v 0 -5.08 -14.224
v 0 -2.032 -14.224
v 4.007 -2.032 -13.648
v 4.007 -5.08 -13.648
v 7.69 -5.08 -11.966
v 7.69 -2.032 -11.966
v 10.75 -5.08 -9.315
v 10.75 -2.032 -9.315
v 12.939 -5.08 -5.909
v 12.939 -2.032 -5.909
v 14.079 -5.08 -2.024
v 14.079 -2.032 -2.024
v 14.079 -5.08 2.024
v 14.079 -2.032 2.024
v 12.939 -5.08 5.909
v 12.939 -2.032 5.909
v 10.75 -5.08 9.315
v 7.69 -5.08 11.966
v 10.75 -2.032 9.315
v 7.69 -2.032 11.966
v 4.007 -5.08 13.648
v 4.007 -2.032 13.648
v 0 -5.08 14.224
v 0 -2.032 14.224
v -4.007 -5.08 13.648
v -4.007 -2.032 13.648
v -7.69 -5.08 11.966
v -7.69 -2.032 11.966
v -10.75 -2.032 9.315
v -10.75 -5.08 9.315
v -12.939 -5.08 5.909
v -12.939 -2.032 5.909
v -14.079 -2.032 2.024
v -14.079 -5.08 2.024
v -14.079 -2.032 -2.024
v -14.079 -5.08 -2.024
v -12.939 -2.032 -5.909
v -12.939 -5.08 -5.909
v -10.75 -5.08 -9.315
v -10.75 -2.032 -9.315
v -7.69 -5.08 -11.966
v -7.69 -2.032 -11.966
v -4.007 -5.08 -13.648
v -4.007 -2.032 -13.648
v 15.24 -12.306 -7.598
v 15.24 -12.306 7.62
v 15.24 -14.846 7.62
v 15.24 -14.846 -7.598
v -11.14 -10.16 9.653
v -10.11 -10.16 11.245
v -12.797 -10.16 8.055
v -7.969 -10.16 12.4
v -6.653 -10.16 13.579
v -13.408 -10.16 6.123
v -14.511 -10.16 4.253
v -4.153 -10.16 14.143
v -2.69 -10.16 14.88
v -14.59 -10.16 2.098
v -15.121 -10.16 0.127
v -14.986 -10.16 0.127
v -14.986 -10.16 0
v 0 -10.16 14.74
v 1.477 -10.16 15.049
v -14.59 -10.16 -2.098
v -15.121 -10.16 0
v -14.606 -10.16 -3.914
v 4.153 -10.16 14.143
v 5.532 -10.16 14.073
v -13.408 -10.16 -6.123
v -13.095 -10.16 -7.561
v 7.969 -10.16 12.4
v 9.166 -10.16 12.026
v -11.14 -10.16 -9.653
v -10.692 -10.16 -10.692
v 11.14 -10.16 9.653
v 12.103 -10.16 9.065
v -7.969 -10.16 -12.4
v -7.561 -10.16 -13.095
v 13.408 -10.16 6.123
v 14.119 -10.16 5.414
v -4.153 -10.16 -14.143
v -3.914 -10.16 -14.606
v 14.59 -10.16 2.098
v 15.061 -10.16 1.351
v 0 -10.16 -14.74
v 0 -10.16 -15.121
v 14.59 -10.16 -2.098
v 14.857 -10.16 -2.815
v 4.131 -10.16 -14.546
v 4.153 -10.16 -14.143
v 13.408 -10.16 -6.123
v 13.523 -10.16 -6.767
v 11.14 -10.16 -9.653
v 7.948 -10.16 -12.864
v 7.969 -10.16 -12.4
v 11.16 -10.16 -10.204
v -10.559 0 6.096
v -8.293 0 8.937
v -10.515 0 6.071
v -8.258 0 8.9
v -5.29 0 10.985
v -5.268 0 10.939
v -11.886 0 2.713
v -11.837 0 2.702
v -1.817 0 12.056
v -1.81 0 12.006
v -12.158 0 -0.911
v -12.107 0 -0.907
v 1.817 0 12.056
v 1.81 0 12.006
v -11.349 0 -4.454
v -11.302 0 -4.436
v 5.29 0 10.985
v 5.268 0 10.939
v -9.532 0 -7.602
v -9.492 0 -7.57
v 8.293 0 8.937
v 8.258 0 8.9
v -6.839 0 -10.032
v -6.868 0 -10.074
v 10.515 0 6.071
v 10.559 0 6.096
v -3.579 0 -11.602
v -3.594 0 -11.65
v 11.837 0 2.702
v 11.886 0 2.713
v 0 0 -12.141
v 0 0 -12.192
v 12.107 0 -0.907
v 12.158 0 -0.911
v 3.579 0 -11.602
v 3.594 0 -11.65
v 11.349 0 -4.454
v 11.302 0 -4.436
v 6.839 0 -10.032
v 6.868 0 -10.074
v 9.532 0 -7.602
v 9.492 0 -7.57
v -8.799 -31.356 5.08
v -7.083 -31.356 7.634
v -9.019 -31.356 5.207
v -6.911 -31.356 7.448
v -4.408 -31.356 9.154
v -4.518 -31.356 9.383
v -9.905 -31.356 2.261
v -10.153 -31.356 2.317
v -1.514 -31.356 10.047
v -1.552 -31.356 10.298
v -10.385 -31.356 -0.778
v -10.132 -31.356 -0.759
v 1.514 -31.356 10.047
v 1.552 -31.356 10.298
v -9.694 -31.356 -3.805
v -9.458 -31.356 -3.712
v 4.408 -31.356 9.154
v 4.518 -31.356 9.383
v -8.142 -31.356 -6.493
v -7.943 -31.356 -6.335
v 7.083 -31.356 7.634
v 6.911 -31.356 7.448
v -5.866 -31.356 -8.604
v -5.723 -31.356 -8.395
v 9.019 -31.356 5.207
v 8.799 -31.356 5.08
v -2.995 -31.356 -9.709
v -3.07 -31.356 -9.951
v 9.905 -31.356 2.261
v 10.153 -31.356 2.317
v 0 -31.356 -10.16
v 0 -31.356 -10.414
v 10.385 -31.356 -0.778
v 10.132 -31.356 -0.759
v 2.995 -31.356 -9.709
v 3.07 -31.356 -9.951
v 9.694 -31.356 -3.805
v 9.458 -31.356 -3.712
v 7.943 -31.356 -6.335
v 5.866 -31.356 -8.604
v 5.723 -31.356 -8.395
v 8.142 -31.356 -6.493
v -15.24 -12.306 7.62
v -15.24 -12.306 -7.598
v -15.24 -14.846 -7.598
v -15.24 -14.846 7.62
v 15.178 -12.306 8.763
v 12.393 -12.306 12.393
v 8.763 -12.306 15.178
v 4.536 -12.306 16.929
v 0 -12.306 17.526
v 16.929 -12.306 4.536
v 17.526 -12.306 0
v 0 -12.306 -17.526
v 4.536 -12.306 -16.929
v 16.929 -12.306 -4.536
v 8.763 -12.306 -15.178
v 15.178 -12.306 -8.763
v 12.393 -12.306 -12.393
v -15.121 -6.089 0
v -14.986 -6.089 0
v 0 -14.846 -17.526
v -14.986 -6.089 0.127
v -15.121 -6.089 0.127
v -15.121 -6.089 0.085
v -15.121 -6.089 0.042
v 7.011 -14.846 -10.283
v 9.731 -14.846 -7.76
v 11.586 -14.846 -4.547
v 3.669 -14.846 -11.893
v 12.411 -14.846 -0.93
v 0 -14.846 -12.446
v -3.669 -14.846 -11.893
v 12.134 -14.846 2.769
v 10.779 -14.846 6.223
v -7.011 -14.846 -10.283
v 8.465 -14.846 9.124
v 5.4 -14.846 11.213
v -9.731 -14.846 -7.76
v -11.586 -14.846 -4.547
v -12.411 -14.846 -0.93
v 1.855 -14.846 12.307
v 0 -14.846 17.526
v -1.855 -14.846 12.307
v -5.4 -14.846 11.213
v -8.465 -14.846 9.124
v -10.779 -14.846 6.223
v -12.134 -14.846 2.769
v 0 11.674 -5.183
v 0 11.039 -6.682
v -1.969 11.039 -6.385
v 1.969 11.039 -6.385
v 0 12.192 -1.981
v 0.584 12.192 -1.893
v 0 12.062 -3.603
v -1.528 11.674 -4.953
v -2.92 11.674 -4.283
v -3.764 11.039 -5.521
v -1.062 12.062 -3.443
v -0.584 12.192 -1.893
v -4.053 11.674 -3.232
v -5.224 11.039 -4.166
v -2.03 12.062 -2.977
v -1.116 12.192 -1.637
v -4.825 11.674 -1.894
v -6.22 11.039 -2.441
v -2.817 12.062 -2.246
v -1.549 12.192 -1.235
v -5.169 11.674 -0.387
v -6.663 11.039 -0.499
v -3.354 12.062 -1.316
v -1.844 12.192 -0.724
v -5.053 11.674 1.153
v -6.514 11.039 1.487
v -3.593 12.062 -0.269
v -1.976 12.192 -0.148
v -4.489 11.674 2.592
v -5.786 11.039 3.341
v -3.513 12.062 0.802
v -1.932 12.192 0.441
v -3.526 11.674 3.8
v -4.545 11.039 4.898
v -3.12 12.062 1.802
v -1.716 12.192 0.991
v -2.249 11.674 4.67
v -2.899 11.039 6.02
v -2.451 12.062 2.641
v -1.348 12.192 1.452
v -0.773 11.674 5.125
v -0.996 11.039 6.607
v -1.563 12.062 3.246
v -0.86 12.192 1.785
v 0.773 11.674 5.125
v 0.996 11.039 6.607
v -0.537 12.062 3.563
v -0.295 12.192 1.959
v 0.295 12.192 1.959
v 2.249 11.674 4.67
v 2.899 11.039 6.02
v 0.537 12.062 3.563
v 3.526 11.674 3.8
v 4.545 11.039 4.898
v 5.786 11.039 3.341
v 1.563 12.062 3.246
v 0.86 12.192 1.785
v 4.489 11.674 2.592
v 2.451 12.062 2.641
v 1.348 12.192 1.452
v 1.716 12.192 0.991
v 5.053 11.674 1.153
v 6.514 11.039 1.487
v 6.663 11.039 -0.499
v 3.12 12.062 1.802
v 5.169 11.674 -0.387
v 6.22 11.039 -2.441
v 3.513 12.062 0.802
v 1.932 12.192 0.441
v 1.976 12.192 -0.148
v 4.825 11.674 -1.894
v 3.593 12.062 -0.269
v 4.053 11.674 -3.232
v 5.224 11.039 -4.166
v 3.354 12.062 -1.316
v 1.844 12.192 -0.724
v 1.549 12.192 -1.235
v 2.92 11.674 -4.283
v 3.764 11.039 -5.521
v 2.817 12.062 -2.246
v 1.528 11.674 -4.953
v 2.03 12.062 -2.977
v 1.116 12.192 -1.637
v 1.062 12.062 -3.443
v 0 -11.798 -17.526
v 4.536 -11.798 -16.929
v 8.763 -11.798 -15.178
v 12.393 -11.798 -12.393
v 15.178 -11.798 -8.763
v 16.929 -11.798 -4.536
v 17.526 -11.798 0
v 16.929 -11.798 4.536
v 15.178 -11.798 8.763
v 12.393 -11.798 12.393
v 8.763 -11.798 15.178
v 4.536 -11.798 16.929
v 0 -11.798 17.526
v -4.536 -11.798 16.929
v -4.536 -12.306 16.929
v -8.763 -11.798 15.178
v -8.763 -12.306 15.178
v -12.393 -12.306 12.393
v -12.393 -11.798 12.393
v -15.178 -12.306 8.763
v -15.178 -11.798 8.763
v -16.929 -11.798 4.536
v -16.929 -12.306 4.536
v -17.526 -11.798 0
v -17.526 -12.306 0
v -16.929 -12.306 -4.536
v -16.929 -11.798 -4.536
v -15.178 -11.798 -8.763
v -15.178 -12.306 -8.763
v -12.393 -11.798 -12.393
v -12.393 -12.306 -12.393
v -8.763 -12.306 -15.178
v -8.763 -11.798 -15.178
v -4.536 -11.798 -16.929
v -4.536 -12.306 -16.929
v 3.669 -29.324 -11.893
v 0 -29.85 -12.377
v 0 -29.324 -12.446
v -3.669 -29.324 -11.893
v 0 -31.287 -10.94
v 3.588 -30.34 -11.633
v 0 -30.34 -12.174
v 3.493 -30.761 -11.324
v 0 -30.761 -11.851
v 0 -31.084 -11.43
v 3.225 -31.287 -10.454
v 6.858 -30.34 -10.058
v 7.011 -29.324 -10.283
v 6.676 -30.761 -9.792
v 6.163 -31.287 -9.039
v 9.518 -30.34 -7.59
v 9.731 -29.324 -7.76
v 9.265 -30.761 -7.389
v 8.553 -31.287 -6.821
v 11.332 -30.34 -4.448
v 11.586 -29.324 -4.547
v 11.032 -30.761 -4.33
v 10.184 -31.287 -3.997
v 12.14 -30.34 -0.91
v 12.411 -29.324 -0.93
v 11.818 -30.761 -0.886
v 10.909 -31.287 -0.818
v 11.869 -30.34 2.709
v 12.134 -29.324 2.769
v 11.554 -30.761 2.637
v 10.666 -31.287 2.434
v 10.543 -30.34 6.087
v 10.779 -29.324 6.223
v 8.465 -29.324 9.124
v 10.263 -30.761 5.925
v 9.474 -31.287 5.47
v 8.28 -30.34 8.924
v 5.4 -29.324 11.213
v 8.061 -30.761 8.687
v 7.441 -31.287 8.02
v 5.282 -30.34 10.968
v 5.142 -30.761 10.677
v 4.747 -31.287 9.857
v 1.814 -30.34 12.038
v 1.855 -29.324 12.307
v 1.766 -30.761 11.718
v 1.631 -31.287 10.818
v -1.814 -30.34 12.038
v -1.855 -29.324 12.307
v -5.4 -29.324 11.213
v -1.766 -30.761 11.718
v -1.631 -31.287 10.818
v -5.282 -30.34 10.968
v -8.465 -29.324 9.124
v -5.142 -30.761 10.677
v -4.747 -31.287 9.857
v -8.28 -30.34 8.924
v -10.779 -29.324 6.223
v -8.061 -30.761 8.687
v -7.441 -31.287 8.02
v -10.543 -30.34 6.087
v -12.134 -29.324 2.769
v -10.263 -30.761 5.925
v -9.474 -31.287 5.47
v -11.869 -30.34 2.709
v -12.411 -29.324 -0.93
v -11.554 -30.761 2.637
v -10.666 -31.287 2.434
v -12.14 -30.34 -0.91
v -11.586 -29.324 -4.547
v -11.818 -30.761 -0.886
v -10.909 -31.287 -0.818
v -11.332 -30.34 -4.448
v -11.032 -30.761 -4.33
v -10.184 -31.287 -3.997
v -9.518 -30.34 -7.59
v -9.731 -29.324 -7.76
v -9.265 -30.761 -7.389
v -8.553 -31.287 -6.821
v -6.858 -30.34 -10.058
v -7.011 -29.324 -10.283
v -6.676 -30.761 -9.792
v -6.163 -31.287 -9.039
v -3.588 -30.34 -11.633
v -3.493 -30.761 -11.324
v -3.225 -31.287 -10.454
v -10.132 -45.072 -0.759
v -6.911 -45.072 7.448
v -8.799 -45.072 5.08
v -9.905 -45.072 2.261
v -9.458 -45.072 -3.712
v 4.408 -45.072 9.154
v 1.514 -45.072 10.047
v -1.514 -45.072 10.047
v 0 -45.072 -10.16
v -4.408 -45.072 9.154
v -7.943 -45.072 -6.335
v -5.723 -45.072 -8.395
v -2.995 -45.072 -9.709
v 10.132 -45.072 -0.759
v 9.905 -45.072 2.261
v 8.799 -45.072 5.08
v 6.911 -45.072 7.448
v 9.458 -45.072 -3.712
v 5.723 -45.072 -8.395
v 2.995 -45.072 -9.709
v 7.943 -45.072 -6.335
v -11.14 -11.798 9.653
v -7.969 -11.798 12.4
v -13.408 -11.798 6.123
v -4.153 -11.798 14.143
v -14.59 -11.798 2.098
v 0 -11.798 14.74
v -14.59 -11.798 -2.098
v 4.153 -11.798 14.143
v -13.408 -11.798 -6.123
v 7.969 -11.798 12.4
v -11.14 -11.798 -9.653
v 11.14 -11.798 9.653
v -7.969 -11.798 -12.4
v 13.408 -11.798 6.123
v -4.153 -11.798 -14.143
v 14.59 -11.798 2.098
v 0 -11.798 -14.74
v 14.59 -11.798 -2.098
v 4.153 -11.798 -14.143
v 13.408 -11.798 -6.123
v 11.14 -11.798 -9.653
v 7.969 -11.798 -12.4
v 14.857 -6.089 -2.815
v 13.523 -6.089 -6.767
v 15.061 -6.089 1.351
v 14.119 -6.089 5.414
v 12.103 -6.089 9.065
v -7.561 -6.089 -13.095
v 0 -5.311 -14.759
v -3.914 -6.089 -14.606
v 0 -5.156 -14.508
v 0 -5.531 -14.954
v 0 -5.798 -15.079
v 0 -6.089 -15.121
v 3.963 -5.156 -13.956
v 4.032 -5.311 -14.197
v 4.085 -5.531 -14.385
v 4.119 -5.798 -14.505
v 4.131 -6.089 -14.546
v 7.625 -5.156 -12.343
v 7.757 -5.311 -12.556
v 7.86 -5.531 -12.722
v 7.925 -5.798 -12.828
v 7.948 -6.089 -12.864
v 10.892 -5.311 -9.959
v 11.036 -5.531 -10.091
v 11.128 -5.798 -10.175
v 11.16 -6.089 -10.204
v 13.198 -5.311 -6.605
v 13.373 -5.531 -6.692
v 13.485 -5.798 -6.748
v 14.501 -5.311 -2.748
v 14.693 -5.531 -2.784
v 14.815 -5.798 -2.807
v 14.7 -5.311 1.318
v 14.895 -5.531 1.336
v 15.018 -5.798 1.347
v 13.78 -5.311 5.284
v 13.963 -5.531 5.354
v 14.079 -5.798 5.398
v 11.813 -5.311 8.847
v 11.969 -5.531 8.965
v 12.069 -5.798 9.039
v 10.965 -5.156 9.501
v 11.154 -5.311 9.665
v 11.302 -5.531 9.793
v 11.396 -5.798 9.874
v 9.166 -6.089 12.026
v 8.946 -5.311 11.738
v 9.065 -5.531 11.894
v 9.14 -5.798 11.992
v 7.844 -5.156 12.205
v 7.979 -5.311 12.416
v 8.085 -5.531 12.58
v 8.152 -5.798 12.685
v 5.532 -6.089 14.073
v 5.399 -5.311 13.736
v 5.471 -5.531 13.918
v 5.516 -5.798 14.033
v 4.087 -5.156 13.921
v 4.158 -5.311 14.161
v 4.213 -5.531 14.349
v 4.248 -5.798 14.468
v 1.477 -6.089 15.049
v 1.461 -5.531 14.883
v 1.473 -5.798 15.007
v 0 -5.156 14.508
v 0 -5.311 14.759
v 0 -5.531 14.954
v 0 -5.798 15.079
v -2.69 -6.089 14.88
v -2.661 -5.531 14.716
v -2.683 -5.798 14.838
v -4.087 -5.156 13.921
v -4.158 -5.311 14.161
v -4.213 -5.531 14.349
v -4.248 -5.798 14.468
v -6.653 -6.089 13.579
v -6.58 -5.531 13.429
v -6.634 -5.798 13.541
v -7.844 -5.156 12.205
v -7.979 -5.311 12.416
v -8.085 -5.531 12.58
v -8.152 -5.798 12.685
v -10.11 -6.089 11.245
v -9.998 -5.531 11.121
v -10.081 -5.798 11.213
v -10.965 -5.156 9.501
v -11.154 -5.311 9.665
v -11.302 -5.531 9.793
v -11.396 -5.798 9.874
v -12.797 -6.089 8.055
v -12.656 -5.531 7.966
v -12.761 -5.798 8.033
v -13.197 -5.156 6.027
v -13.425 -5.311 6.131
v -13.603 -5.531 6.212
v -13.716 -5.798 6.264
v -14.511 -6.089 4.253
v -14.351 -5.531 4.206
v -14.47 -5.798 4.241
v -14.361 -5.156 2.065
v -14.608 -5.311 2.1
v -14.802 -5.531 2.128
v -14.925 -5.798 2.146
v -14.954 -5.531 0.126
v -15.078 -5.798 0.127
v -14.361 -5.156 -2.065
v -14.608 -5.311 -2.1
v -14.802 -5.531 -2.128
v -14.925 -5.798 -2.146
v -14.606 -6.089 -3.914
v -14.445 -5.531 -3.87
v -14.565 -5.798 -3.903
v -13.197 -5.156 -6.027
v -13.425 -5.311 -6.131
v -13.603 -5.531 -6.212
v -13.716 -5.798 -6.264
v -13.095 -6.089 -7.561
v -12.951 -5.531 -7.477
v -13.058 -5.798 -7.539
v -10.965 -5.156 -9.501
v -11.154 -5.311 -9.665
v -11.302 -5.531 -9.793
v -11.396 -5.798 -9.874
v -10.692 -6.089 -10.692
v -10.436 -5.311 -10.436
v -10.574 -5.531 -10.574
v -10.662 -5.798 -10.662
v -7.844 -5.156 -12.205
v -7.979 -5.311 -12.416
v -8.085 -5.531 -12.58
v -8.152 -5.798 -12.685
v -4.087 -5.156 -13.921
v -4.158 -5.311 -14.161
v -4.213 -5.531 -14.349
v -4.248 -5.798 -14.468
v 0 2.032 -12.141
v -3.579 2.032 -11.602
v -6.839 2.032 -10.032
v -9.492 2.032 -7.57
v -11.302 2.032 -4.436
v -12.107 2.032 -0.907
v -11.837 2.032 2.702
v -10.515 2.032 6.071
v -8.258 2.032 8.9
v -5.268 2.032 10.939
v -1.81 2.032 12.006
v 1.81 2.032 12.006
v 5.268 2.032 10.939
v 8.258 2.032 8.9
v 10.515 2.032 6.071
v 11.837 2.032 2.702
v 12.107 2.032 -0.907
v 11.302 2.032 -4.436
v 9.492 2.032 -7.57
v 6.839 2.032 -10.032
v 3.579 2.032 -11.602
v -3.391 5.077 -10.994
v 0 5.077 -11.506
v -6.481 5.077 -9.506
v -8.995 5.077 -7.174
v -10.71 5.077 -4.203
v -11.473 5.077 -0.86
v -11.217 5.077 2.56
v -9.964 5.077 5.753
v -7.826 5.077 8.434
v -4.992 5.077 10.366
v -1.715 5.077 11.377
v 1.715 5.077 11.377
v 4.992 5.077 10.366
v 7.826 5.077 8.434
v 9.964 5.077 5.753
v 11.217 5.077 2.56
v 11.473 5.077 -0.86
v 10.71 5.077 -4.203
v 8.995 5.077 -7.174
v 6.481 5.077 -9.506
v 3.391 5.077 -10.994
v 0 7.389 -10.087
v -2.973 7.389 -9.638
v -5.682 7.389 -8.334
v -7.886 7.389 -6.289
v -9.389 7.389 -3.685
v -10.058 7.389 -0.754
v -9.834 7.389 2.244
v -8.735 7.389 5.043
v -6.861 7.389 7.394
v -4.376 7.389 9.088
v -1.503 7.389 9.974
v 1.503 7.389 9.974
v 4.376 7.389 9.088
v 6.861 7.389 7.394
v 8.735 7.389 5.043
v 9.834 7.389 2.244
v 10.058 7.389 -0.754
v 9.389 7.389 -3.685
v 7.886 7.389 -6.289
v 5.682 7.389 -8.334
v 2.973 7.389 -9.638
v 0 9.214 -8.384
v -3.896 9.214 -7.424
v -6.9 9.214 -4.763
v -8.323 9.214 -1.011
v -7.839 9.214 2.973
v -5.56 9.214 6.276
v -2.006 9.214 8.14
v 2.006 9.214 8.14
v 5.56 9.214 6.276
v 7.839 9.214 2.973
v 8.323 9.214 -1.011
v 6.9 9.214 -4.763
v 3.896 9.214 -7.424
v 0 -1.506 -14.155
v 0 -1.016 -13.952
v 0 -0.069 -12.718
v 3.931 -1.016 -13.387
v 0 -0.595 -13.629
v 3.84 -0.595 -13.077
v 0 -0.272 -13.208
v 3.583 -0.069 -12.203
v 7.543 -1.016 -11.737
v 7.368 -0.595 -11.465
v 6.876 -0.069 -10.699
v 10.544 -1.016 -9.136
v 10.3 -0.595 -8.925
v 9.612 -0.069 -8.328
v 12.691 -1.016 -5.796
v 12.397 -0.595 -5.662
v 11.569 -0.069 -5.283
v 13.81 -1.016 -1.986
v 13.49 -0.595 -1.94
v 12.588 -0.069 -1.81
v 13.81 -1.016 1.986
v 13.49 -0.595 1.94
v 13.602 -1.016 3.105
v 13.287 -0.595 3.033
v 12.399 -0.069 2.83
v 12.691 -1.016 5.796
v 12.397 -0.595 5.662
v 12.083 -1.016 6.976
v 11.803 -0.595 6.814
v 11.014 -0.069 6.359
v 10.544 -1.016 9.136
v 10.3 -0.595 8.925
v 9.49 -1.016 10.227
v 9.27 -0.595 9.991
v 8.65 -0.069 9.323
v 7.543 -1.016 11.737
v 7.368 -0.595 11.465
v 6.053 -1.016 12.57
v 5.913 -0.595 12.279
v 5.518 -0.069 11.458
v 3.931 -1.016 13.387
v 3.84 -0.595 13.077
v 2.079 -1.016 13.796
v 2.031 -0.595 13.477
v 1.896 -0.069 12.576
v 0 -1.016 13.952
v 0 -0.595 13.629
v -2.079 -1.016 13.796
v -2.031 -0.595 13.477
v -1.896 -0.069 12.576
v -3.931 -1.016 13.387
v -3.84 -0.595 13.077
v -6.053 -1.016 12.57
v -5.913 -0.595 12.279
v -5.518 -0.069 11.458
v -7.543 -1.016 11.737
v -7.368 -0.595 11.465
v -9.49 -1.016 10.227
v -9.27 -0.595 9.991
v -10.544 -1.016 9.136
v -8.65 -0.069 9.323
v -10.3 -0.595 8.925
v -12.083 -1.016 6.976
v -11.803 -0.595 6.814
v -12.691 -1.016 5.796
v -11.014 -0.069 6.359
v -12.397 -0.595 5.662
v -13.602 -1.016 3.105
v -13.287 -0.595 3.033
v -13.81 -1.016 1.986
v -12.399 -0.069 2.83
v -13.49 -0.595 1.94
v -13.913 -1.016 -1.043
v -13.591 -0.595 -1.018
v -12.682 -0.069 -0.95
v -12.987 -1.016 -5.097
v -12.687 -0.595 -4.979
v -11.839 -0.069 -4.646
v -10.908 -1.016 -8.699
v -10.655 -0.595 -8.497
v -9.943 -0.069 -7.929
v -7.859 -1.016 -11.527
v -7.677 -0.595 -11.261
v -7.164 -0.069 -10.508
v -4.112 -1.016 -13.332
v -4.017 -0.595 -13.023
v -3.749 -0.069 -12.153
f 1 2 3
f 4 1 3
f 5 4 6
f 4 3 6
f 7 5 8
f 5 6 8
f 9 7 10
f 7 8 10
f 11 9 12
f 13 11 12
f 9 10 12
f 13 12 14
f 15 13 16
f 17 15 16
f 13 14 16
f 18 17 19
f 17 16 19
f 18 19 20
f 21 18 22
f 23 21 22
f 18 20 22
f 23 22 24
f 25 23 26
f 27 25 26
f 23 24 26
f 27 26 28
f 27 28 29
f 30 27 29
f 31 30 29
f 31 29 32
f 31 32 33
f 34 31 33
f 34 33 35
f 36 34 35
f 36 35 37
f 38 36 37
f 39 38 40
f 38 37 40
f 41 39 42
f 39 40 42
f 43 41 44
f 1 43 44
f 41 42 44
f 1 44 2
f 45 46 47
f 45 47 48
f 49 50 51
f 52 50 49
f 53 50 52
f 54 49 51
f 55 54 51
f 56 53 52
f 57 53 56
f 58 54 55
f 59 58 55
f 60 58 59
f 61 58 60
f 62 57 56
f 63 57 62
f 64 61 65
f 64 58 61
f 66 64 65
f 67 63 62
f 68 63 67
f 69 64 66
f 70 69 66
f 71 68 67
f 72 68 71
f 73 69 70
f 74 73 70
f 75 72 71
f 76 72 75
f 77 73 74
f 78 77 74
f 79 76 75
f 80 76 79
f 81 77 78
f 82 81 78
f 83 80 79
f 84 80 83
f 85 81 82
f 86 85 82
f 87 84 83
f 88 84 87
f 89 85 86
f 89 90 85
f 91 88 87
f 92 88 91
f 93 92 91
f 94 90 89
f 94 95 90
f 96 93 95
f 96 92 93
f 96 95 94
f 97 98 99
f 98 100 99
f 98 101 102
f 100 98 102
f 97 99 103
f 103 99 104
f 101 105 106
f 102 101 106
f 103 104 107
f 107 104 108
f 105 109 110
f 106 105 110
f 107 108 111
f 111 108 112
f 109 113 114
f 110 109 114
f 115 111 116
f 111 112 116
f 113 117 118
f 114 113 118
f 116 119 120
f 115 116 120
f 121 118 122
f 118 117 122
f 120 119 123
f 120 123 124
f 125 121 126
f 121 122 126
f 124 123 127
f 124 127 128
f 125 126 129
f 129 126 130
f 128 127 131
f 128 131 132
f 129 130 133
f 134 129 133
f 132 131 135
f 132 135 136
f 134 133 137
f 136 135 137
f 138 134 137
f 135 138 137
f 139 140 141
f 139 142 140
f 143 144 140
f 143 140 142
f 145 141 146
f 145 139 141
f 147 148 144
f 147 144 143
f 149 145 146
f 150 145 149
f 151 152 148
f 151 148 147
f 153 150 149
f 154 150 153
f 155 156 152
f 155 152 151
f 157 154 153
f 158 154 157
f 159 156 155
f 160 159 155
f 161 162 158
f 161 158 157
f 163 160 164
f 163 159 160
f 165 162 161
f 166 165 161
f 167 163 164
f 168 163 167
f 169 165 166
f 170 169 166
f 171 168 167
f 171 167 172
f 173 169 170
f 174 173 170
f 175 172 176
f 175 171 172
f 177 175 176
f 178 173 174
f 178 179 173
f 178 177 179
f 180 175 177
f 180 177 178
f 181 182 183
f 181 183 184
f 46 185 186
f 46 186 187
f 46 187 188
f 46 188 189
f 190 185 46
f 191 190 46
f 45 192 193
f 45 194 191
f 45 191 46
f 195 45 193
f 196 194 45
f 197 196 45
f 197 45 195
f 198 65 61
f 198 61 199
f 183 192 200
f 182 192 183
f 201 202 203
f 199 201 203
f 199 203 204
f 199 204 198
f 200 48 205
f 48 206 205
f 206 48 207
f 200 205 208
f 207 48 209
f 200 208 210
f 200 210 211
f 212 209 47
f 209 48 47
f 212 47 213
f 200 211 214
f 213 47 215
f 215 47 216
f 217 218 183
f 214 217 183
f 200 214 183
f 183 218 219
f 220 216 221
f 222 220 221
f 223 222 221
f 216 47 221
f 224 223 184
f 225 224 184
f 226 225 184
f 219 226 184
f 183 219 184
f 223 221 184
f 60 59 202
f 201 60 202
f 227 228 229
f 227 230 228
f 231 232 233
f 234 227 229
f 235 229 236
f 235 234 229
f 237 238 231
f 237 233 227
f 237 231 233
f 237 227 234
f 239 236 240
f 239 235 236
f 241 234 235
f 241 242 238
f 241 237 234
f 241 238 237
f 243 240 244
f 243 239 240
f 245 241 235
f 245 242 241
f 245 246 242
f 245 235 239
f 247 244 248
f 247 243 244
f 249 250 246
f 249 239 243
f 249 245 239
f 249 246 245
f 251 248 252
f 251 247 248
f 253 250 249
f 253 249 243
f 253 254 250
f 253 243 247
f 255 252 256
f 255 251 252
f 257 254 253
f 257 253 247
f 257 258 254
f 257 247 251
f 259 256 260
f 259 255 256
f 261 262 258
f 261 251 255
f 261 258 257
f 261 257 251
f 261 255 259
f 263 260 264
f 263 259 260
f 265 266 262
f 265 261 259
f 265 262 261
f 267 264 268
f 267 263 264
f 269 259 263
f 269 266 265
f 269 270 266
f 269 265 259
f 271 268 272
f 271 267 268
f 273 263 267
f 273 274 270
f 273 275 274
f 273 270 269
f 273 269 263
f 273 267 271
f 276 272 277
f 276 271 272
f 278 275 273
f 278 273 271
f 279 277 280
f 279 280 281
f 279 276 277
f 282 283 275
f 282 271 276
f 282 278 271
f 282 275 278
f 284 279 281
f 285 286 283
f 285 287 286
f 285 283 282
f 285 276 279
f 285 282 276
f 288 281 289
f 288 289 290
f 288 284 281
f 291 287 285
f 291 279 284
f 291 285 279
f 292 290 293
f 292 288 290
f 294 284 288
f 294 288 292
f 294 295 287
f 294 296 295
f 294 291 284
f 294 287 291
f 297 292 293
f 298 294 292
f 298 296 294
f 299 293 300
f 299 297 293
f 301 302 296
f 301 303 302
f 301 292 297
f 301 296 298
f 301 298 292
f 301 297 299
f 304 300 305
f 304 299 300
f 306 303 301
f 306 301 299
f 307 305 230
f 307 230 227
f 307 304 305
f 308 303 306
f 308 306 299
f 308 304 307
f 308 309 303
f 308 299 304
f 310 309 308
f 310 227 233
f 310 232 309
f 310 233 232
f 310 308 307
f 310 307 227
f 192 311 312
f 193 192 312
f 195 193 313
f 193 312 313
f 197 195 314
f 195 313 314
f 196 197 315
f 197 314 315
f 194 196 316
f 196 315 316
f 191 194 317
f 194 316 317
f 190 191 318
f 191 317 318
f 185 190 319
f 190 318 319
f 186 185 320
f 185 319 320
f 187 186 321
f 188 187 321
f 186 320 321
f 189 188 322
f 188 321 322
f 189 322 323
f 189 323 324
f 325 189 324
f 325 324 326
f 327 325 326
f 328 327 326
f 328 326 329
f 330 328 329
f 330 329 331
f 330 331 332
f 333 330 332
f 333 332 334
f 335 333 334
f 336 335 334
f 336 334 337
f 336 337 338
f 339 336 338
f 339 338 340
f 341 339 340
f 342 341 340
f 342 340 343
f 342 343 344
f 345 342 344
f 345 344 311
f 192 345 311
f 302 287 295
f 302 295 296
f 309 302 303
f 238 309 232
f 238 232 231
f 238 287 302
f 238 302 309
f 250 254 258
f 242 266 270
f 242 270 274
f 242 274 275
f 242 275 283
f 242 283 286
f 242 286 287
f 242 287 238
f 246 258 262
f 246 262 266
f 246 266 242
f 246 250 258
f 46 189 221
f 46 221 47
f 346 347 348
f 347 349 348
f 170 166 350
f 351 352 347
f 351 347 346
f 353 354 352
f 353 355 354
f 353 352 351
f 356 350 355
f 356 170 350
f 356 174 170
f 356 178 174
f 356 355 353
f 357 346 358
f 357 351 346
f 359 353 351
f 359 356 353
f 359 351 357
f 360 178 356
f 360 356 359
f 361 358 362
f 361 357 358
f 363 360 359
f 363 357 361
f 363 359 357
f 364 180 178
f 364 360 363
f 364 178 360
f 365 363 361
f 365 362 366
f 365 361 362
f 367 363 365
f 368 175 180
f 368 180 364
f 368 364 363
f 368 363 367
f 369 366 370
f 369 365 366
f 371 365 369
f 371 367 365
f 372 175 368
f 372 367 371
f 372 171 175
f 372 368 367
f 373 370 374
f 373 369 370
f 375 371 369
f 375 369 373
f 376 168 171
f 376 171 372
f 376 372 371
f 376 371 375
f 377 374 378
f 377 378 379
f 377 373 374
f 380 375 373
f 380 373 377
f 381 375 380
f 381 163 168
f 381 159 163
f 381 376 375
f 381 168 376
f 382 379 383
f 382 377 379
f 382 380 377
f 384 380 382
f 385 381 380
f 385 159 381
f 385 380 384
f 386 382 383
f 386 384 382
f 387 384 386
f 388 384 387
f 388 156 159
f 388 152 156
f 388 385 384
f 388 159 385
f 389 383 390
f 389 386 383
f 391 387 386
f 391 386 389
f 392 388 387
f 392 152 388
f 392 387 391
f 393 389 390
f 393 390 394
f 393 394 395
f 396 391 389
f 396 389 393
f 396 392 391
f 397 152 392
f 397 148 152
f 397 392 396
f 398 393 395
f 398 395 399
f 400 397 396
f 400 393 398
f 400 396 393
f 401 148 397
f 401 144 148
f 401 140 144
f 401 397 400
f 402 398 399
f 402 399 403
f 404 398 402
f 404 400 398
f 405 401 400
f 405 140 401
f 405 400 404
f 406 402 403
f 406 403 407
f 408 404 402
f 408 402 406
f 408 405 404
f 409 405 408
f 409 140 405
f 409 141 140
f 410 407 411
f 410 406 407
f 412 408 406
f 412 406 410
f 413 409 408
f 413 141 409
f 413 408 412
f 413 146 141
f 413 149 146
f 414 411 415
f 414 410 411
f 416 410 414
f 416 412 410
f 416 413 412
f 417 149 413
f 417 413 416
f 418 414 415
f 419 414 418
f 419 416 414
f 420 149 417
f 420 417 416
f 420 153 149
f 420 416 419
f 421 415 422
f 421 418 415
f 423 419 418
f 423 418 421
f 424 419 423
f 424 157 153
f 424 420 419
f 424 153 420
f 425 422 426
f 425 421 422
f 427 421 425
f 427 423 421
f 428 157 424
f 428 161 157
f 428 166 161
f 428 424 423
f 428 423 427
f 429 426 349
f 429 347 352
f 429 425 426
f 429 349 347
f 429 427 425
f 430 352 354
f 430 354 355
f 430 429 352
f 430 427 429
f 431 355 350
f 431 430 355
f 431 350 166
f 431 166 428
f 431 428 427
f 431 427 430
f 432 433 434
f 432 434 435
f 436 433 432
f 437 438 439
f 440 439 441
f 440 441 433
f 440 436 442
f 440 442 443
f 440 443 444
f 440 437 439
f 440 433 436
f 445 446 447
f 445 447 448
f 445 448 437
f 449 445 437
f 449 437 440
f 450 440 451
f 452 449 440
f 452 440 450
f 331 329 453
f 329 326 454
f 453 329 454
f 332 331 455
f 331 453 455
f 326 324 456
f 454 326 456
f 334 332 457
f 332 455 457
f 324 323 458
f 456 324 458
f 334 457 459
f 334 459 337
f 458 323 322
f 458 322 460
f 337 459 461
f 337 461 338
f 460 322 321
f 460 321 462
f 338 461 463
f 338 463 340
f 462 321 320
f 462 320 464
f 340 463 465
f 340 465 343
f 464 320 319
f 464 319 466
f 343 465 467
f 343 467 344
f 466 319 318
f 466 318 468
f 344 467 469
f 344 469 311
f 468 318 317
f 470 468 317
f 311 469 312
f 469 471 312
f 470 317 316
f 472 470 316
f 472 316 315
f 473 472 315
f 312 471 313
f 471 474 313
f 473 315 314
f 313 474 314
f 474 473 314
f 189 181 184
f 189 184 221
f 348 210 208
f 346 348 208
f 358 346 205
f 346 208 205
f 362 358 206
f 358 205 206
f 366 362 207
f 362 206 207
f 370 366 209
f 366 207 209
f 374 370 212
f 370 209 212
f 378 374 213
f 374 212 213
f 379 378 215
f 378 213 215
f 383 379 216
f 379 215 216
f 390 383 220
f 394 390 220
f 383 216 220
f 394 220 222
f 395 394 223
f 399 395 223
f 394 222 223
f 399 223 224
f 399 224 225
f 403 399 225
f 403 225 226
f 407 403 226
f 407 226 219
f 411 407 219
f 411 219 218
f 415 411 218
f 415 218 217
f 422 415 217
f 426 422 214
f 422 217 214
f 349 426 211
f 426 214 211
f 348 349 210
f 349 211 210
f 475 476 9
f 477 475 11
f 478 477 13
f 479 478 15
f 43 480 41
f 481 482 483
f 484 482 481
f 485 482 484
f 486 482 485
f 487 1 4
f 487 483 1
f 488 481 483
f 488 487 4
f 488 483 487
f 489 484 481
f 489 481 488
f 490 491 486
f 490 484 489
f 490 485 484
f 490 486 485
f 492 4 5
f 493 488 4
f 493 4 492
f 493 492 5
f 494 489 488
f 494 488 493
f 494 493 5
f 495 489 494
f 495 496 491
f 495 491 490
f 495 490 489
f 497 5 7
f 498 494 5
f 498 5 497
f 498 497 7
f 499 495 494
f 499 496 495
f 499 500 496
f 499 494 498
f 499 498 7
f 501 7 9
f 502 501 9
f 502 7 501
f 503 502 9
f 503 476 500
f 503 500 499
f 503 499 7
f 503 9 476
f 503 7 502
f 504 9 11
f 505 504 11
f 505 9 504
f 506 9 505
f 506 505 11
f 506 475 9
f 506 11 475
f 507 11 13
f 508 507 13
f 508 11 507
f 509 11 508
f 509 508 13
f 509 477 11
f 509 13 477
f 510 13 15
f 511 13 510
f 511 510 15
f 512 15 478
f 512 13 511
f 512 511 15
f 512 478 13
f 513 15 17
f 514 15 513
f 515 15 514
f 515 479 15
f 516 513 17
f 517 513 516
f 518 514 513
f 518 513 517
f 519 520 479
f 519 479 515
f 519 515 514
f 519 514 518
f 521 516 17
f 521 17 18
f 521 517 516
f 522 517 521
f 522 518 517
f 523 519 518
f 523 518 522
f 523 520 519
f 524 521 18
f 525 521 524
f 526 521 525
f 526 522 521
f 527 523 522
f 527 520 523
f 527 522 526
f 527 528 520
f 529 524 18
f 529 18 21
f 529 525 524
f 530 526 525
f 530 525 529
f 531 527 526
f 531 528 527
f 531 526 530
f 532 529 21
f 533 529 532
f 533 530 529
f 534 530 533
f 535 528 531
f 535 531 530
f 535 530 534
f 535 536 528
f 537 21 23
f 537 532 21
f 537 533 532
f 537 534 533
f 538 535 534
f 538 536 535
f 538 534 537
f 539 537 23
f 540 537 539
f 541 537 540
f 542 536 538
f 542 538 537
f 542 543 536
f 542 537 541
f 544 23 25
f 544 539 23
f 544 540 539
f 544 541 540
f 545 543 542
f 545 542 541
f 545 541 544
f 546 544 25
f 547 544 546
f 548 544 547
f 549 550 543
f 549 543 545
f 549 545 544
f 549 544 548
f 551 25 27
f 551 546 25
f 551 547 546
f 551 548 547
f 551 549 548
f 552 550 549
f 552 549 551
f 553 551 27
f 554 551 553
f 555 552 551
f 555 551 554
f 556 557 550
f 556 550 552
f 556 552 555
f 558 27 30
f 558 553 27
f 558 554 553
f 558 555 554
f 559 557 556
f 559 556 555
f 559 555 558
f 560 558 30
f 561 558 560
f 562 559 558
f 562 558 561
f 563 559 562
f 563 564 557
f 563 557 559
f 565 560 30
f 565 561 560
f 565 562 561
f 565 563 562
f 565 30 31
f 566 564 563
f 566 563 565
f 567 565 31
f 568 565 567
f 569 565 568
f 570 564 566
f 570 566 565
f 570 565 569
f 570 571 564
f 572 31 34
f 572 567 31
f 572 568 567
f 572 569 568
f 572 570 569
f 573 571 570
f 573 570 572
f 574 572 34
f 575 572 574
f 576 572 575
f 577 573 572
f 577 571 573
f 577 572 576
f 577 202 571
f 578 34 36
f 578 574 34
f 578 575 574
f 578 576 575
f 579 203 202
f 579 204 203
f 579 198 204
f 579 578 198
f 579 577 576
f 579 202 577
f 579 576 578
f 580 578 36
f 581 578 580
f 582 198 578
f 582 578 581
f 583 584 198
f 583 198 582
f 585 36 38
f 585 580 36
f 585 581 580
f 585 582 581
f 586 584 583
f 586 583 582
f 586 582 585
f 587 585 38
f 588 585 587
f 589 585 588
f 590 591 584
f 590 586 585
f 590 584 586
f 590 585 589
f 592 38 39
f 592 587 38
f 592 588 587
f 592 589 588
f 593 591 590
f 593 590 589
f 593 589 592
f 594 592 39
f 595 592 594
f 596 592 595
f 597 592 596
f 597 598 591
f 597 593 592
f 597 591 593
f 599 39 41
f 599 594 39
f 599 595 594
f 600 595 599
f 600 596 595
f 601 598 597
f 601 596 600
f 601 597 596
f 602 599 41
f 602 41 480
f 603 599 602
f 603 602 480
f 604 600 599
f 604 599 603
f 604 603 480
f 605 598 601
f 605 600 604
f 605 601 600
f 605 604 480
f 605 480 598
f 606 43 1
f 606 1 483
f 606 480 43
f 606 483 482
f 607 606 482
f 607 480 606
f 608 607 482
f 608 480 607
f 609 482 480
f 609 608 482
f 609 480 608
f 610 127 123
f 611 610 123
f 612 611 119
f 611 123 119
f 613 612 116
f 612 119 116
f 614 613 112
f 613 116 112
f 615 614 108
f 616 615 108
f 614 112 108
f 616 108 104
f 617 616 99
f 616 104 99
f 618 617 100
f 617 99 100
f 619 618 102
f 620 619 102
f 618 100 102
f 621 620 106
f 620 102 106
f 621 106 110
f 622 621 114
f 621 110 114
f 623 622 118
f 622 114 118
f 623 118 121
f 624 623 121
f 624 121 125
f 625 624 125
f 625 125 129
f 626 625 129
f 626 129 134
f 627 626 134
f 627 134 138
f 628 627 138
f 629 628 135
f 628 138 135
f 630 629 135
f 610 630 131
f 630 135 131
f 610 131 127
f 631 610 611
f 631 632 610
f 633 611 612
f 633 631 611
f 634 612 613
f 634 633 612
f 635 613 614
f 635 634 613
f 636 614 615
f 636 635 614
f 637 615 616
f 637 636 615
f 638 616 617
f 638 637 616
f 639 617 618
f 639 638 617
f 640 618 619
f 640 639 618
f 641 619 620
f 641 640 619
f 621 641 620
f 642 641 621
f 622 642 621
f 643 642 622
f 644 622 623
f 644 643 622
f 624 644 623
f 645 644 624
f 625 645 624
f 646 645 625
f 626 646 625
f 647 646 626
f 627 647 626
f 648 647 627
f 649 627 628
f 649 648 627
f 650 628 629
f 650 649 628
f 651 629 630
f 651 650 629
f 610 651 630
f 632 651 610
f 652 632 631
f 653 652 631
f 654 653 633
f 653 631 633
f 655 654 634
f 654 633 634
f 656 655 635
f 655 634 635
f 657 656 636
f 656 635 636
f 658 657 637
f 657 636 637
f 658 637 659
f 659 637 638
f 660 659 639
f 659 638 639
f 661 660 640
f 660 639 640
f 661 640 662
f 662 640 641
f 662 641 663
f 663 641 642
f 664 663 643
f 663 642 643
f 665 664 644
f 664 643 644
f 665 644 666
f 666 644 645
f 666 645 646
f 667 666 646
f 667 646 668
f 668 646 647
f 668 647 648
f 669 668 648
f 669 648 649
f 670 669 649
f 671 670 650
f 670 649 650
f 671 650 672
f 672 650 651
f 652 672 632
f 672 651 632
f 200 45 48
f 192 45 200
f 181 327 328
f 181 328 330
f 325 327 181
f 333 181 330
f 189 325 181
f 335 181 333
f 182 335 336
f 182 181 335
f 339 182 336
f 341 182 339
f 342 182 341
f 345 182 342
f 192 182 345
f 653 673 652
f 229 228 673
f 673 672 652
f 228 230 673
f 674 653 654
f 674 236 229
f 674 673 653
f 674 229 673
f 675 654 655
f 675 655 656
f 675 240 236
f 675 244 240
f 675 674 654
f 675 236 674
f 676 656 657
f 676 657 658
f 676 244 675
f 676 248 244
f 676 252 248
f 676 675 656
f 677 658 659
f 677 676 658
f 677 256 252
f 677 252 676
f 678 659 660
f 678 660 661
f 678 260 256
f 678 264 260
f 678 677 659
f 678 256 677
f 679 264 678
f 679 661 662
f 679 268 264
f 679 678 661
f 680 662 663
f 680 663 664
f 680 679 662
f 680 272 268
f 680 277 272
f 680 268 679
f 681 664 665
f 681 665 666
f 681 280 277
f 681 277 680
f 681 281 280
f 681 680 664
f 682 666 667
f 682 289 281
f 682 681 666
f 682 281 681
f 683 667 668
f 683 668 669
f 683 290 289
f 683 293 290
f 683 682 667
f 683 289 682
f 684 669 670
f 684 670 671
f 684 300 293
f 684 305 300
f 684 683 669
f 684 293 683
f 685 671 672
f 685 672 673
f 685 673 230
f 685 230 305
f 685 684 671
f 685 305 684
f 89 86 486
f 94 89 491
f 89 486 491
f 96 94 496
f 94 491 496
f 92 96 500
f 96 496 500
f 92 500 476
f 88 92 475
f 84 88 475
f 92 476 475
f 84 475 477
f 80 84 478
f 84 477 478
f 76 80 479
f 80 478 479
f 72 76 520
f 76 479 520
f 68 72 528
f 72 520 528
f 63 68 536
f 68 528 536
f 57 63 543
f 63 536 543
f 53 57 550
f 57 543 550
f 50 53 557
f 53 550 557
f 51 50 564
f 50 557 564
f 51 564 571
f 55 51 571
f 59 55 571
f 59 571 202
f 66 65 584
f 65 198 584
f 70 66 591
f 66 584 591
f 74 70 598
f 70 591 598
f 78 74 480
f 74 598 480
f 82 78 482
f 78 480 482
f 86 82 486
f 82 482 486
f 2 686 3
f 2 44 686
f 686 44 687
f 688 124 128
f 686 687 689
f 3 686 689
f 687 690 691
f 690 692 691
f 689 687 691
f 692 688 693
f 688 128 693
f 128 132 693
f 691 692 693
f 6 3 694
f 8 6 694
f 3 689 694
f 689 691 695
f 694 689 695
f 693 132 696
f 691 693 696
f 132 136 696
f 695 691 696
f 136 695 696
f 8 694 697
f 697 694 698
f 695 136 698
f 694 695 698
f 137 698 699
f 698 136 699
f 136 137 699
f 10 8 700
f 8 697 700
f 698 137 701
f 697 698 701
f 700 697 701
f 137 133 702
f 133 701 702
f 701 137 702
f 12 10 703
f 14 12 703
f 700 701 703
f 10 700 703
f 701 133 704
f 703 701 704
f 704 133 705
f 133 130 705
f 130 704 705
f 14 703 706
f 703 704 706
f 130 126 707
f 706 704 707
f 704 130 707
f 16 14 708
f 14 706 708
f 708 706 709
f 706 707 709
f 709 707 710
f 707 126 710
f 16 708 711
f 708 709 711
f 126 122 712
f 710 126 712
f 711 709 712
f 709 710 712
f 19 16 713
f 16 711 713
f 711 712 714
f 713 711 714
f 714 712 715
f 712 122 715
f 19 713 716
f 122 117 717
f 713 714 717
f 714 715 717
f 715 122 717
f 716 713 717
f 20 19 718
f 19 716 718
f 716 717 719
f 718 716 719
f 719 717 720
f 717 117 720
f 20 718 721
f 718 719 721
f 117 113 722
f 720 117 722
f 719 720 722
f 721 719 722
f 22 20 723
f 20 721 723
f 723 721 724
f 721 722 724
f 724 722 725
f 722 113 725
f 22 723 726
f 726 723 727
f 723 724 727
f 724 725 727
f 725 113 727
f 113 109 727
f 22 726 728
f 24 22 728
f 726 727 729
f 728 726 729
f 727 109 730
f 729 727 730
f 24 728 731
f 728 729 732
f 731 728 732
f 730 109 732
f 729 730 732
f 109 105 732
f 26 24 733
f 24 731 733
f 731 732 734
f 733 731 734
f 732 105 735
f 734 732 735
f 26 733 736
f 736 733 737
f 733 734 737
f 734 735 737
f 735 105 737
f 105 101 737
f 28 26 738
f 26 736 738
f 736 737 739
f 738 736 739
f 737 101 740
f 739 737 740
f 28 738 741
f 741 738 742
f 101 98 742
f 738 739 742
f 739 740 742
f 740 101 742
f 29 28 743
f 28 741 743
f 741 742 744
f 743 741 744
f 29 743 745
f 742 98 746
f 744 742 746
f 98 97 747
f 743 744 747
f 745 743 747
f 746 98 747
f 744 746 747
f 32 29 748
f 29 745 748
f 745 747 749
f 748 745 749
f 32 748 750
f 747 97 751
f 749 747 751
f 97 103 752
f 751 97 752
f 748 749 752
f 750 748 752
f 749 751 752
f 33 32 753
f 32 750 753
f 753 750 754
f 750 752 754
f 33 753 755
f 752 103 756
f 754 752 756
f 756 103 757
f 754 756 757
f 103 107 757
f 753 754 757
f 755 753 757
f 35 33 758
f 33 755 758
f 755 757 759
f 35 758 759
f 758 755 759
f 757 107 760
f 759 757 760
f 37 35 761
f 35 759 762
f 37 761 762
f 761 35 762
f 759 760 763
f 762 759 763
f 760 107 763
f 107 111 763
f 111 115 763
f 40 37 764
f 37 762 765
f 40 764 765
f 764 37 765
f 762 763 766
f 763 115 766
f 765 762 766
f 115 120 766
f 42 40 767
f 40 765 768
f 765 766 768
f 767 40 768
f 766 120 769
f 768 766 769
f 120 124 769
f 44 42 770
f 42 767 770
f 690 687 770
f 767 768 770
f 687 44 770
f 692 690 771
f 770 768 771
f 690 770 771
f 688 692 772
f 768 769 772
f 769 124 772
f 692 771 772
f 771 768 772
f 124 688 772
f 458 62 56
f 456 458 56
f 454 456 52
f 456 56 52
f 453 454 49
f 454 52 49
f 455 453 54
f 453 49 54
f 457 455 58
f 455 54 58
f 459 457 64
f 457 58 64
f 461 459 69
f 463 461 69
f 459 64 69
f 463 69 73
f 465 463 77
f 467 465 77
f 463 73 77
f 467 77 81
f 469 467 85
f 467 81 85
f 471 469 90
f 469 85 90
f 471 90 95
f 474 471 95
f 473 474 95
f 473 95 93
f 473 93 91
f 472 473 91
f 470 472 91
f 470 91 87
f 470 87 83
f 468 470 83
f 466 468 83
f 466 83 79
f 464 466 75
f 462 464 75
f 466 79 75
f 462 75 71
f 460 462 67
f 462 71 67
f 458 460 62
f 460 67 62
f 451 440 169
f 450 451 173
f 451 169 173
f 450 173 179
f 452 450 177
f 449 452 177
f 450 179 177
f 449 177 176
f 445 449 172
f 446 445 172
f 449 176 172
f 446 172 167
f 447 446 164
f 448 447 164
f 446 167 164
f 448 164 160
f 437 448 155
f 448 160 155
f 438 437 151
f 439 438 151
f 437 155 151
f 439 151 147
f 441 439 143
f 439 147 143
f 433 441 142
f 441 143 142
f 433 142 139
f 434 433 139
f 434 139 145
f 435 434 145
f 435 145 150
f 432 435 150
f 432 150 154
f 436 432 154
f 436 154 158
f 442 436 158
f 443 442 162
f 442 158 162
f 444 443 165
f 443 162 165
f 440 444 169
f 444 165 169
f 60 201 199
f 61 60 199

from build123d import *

# Parameters (mm, degrees)
SKETCH1_R           = 12.1412
BOSS_EXTRUDE1_DEPTH = 12.192
FILLET1_R           = 10.16
SKETCH3_R           = 14.224
BOSS_EXTRUDE2_DEPTH = 5.08
FILLET6_R           = 2.032
SKETCH8_R           = 15.121257553
BOSS_EXTRUDE3_DEPTH = 5.08
FILLET7_R           = 1.016
SKETCH9_W           = 0.127
SKETCH9_H           = 4.070962721
CUT_EXTRUDE1_DEPTH  = 0.254
SKETCH13_R          = 14.74025754
BOSS_EXTRUDE4_DEPTH = 1.6383
SKETCH14_R          = 17.526
BOSS_EXTRUDE5_DEPTH = 0.508
BOSS_EXTRUDE6_DEPTH = 2.54
SKETCH16_R          = 12.446
BOSS_EXTRUDE7_DEPTH = 16.51
SKETCH17_R          = 10.16
BOSS_EXTRUDE8_DEPTH = 13.716
FILLET8_R           = 2.032


with BuildPart() as part:
    # Sketch1 → Boss-Extrude1 (new body)
    with BuildSketch(Plane(origin=(0, 0, 0), x_dir=(1, 0, 0), z_dir=(0, 1, 0))):
        with Locations(Location((0, 0, 0), (0, 0, 90))):
            Circle(SKETCH1_R)
    extrude(amount=BOSS_EXTRUDE1_DEPTH)

    # Fillet1
    fillet1_edges = [part.edges().sort_by_distance(p)[0] for p in [
        (0, 12.192, 12.1412),
    ]]
    fillet(fillet1_edges, radius=FILLET1_R)

    # Sketch3 → Boss-Extrude2 (add)
    with BuildSketch(Plane.XZ):
        with Locations(Location((0, 0, 0), (0, 0, 270))):
            Circle(SKETCH3_R)
    extrude(amount=BOSS_EXTRUDE2_DEPTH)

    # Sketch4 → Cut-Revolve1 (revolve, cut)
    with BuildSketch(Plane(origin=(0, 0, 0), x_dir=(0, 0, -1), z_dir=(1, 0, 0))):
        Polygon((11.292993812, 6.096), (6.681516056, 11.039365263), (11.292993812, 11.039365263), align=None)
    revolve(axis=Axis((0, 0, 0), (0, 1, 0)), mode=Mode.SUBTRACT)

    # Sketch5 → Cut-Revolve2 (revolve, cut)
    with BuildSketch(Plane(origin=(0, 0, 0), x_dir=(0, 0, -1), z_dir=(1, 0, 0))):
        Polygon((12.1412, 2.032), (11.292993812, 6.096), (14.961110493, 2.032), align=None)
    revolve(axis=Axis((0, 0, 0), (0, 1, 0)), mode=Mode.SUBTRACT)

    # Sketch7 → Cut-Revolve3 (revolve, cut)
    with BuildSketch(Plane.XY, mode=Mode.PRIVATE) as cut_revolve3_sk:
        Polygon((-10.086523159, 7.389300203), (-11.857198071, 4.504575846), (-11.857198071, 7.389300203), align=None)
    revolve(cut_revolve3_sk.sketch.rotate(Axis((0, 0, 0), (0, 1, 0)), 270), axis=Axis((0, 0, 0), (0, 1, 0)), mode=Mode.SUBTRACT)

    # Fillet6
    fillet6_edges = [part.edges().sort_by_distance(p)[0] for p in [
        (0, 0, 14.224),
    ]]
    fillet(fillet6_edges, radius=FILLET6_R)

    # Sketch8 → Boss-Extrude3 (add)
    with BuildSketch(Plane.XZ.offset(5.08)):
        with Locations(Location((0, 0, 0), (0, 0, 270))):
            Circle(SKETCH8_R)
    extrude(amount=BOSS_EXTRUDE3_DEPTH)

    # Fillet7
    # the kernel refuses this fillet: 1.016 mm, written as the material it takes off along each edge
    with BuildSketch(Plane(origin=(0, -5.08, 0), x_dir=(0, 0, -1), z_dir=(-1, 0, 0))) as fillet7_piece_1:
        with BuildLine():
            CenterArc((14.105257553, 1.009037279), FILLET7_R, 276.711639073, 83.288360927)
            Line((14.224, 0), (14.226374849, -0.020180746))
            ThreePointArc((14.226374849, -0.020180746), (14.672628776, -0.02032), (15.121257553, -0.02032))
            Line((15.121257553, -0.02032), (15.141577553, 0))
            Line((15.141577553, 0), (15.141577553, 1.009037279))
            Line((15.141577553, 1.009037279), (15.121257553, 1.009037279))
        make_face()
    revolve(axis=Axis((0, -5.08, 0), (0, -1, 0)), mode=Mode.SUBTRACT)

    # Sketch9 → Cut-Extrude1 (cut)
    with BuildSketch(Plane(origin=(-15.24, 0, 0), x_dir=(0, 0, -1), z_dir=(1, 0, 0))):
        with Locations((-0.0635, -8.124518639)):
            Rectangle(SKETCH9_W, SKETCH9_H)
    extrude(amount=CUT_EXTRUDE1_DEPTH, mode=Mode.SUBTRACT)

    # Sketch13 → Boss-Extrude4 (add)
    with BuildSketch(Plane.XZ.offset(10.16)):
        with Locations(Location((0, 0, 0), (0, 0, 90))):
            Circle(SKETCH13_R)
    extrude(amount=BOSS_EXTRUDE4_DEPTH)

    # Sketch14 → Boss-Extrude5 (add)
    with BuildSketch(Plane.XZ.offset(11.7983)):
        with Locations(Location((0, 0, 0), (0, 0, 270))):
            Circle(SKETCH14_R)
    extrude(amount=BOSS_EXTRUDE5_DEPTH)

    # Sketch15 → Boss-Extrude6 (add)
    with BuildSketch(Plane.XZ.offset(12.3063)):
        Polygon((15.24, 7.62), (15.24, -7.597992884), (0, -17.526), (-15.24, -7.597992884), (-15.24, 7.62), (0, 17.526), align=None)
    extrude(amount=BOSS_EXTRUDE6_DEPTH)

    # Sketch16 → Boss-Extrude7 (add)
    with BuildSketch(Plane.XZ.offset(14.8463)):
        with Locations(Location((0, 0, 0), (0, 0, 270))):
            Circle(SKETCH16_R)
    extrude(amount=BOSS_EXTRUDE7_DEPTH)

    # Sketch17 → Boss-Extrude8 (add)
    with BuildSketch(Plane.XZ.offset(31.3563)):
        with Locations(Location((0, 0, 0), (0, 0, 270))):
            Circle(SKETCH17_R)
    extrude(amount=BOSS_EXTRUDE8_DEPTH)

    # Fillet8
    fillet8_edges = [part.edges().sort_by_distance(p)[0] for p in [
        (0, -31.3563, 12.446),
    ]]
    fillet(fillet8_edges, radius=FILLET8_R)


solid = part.part
